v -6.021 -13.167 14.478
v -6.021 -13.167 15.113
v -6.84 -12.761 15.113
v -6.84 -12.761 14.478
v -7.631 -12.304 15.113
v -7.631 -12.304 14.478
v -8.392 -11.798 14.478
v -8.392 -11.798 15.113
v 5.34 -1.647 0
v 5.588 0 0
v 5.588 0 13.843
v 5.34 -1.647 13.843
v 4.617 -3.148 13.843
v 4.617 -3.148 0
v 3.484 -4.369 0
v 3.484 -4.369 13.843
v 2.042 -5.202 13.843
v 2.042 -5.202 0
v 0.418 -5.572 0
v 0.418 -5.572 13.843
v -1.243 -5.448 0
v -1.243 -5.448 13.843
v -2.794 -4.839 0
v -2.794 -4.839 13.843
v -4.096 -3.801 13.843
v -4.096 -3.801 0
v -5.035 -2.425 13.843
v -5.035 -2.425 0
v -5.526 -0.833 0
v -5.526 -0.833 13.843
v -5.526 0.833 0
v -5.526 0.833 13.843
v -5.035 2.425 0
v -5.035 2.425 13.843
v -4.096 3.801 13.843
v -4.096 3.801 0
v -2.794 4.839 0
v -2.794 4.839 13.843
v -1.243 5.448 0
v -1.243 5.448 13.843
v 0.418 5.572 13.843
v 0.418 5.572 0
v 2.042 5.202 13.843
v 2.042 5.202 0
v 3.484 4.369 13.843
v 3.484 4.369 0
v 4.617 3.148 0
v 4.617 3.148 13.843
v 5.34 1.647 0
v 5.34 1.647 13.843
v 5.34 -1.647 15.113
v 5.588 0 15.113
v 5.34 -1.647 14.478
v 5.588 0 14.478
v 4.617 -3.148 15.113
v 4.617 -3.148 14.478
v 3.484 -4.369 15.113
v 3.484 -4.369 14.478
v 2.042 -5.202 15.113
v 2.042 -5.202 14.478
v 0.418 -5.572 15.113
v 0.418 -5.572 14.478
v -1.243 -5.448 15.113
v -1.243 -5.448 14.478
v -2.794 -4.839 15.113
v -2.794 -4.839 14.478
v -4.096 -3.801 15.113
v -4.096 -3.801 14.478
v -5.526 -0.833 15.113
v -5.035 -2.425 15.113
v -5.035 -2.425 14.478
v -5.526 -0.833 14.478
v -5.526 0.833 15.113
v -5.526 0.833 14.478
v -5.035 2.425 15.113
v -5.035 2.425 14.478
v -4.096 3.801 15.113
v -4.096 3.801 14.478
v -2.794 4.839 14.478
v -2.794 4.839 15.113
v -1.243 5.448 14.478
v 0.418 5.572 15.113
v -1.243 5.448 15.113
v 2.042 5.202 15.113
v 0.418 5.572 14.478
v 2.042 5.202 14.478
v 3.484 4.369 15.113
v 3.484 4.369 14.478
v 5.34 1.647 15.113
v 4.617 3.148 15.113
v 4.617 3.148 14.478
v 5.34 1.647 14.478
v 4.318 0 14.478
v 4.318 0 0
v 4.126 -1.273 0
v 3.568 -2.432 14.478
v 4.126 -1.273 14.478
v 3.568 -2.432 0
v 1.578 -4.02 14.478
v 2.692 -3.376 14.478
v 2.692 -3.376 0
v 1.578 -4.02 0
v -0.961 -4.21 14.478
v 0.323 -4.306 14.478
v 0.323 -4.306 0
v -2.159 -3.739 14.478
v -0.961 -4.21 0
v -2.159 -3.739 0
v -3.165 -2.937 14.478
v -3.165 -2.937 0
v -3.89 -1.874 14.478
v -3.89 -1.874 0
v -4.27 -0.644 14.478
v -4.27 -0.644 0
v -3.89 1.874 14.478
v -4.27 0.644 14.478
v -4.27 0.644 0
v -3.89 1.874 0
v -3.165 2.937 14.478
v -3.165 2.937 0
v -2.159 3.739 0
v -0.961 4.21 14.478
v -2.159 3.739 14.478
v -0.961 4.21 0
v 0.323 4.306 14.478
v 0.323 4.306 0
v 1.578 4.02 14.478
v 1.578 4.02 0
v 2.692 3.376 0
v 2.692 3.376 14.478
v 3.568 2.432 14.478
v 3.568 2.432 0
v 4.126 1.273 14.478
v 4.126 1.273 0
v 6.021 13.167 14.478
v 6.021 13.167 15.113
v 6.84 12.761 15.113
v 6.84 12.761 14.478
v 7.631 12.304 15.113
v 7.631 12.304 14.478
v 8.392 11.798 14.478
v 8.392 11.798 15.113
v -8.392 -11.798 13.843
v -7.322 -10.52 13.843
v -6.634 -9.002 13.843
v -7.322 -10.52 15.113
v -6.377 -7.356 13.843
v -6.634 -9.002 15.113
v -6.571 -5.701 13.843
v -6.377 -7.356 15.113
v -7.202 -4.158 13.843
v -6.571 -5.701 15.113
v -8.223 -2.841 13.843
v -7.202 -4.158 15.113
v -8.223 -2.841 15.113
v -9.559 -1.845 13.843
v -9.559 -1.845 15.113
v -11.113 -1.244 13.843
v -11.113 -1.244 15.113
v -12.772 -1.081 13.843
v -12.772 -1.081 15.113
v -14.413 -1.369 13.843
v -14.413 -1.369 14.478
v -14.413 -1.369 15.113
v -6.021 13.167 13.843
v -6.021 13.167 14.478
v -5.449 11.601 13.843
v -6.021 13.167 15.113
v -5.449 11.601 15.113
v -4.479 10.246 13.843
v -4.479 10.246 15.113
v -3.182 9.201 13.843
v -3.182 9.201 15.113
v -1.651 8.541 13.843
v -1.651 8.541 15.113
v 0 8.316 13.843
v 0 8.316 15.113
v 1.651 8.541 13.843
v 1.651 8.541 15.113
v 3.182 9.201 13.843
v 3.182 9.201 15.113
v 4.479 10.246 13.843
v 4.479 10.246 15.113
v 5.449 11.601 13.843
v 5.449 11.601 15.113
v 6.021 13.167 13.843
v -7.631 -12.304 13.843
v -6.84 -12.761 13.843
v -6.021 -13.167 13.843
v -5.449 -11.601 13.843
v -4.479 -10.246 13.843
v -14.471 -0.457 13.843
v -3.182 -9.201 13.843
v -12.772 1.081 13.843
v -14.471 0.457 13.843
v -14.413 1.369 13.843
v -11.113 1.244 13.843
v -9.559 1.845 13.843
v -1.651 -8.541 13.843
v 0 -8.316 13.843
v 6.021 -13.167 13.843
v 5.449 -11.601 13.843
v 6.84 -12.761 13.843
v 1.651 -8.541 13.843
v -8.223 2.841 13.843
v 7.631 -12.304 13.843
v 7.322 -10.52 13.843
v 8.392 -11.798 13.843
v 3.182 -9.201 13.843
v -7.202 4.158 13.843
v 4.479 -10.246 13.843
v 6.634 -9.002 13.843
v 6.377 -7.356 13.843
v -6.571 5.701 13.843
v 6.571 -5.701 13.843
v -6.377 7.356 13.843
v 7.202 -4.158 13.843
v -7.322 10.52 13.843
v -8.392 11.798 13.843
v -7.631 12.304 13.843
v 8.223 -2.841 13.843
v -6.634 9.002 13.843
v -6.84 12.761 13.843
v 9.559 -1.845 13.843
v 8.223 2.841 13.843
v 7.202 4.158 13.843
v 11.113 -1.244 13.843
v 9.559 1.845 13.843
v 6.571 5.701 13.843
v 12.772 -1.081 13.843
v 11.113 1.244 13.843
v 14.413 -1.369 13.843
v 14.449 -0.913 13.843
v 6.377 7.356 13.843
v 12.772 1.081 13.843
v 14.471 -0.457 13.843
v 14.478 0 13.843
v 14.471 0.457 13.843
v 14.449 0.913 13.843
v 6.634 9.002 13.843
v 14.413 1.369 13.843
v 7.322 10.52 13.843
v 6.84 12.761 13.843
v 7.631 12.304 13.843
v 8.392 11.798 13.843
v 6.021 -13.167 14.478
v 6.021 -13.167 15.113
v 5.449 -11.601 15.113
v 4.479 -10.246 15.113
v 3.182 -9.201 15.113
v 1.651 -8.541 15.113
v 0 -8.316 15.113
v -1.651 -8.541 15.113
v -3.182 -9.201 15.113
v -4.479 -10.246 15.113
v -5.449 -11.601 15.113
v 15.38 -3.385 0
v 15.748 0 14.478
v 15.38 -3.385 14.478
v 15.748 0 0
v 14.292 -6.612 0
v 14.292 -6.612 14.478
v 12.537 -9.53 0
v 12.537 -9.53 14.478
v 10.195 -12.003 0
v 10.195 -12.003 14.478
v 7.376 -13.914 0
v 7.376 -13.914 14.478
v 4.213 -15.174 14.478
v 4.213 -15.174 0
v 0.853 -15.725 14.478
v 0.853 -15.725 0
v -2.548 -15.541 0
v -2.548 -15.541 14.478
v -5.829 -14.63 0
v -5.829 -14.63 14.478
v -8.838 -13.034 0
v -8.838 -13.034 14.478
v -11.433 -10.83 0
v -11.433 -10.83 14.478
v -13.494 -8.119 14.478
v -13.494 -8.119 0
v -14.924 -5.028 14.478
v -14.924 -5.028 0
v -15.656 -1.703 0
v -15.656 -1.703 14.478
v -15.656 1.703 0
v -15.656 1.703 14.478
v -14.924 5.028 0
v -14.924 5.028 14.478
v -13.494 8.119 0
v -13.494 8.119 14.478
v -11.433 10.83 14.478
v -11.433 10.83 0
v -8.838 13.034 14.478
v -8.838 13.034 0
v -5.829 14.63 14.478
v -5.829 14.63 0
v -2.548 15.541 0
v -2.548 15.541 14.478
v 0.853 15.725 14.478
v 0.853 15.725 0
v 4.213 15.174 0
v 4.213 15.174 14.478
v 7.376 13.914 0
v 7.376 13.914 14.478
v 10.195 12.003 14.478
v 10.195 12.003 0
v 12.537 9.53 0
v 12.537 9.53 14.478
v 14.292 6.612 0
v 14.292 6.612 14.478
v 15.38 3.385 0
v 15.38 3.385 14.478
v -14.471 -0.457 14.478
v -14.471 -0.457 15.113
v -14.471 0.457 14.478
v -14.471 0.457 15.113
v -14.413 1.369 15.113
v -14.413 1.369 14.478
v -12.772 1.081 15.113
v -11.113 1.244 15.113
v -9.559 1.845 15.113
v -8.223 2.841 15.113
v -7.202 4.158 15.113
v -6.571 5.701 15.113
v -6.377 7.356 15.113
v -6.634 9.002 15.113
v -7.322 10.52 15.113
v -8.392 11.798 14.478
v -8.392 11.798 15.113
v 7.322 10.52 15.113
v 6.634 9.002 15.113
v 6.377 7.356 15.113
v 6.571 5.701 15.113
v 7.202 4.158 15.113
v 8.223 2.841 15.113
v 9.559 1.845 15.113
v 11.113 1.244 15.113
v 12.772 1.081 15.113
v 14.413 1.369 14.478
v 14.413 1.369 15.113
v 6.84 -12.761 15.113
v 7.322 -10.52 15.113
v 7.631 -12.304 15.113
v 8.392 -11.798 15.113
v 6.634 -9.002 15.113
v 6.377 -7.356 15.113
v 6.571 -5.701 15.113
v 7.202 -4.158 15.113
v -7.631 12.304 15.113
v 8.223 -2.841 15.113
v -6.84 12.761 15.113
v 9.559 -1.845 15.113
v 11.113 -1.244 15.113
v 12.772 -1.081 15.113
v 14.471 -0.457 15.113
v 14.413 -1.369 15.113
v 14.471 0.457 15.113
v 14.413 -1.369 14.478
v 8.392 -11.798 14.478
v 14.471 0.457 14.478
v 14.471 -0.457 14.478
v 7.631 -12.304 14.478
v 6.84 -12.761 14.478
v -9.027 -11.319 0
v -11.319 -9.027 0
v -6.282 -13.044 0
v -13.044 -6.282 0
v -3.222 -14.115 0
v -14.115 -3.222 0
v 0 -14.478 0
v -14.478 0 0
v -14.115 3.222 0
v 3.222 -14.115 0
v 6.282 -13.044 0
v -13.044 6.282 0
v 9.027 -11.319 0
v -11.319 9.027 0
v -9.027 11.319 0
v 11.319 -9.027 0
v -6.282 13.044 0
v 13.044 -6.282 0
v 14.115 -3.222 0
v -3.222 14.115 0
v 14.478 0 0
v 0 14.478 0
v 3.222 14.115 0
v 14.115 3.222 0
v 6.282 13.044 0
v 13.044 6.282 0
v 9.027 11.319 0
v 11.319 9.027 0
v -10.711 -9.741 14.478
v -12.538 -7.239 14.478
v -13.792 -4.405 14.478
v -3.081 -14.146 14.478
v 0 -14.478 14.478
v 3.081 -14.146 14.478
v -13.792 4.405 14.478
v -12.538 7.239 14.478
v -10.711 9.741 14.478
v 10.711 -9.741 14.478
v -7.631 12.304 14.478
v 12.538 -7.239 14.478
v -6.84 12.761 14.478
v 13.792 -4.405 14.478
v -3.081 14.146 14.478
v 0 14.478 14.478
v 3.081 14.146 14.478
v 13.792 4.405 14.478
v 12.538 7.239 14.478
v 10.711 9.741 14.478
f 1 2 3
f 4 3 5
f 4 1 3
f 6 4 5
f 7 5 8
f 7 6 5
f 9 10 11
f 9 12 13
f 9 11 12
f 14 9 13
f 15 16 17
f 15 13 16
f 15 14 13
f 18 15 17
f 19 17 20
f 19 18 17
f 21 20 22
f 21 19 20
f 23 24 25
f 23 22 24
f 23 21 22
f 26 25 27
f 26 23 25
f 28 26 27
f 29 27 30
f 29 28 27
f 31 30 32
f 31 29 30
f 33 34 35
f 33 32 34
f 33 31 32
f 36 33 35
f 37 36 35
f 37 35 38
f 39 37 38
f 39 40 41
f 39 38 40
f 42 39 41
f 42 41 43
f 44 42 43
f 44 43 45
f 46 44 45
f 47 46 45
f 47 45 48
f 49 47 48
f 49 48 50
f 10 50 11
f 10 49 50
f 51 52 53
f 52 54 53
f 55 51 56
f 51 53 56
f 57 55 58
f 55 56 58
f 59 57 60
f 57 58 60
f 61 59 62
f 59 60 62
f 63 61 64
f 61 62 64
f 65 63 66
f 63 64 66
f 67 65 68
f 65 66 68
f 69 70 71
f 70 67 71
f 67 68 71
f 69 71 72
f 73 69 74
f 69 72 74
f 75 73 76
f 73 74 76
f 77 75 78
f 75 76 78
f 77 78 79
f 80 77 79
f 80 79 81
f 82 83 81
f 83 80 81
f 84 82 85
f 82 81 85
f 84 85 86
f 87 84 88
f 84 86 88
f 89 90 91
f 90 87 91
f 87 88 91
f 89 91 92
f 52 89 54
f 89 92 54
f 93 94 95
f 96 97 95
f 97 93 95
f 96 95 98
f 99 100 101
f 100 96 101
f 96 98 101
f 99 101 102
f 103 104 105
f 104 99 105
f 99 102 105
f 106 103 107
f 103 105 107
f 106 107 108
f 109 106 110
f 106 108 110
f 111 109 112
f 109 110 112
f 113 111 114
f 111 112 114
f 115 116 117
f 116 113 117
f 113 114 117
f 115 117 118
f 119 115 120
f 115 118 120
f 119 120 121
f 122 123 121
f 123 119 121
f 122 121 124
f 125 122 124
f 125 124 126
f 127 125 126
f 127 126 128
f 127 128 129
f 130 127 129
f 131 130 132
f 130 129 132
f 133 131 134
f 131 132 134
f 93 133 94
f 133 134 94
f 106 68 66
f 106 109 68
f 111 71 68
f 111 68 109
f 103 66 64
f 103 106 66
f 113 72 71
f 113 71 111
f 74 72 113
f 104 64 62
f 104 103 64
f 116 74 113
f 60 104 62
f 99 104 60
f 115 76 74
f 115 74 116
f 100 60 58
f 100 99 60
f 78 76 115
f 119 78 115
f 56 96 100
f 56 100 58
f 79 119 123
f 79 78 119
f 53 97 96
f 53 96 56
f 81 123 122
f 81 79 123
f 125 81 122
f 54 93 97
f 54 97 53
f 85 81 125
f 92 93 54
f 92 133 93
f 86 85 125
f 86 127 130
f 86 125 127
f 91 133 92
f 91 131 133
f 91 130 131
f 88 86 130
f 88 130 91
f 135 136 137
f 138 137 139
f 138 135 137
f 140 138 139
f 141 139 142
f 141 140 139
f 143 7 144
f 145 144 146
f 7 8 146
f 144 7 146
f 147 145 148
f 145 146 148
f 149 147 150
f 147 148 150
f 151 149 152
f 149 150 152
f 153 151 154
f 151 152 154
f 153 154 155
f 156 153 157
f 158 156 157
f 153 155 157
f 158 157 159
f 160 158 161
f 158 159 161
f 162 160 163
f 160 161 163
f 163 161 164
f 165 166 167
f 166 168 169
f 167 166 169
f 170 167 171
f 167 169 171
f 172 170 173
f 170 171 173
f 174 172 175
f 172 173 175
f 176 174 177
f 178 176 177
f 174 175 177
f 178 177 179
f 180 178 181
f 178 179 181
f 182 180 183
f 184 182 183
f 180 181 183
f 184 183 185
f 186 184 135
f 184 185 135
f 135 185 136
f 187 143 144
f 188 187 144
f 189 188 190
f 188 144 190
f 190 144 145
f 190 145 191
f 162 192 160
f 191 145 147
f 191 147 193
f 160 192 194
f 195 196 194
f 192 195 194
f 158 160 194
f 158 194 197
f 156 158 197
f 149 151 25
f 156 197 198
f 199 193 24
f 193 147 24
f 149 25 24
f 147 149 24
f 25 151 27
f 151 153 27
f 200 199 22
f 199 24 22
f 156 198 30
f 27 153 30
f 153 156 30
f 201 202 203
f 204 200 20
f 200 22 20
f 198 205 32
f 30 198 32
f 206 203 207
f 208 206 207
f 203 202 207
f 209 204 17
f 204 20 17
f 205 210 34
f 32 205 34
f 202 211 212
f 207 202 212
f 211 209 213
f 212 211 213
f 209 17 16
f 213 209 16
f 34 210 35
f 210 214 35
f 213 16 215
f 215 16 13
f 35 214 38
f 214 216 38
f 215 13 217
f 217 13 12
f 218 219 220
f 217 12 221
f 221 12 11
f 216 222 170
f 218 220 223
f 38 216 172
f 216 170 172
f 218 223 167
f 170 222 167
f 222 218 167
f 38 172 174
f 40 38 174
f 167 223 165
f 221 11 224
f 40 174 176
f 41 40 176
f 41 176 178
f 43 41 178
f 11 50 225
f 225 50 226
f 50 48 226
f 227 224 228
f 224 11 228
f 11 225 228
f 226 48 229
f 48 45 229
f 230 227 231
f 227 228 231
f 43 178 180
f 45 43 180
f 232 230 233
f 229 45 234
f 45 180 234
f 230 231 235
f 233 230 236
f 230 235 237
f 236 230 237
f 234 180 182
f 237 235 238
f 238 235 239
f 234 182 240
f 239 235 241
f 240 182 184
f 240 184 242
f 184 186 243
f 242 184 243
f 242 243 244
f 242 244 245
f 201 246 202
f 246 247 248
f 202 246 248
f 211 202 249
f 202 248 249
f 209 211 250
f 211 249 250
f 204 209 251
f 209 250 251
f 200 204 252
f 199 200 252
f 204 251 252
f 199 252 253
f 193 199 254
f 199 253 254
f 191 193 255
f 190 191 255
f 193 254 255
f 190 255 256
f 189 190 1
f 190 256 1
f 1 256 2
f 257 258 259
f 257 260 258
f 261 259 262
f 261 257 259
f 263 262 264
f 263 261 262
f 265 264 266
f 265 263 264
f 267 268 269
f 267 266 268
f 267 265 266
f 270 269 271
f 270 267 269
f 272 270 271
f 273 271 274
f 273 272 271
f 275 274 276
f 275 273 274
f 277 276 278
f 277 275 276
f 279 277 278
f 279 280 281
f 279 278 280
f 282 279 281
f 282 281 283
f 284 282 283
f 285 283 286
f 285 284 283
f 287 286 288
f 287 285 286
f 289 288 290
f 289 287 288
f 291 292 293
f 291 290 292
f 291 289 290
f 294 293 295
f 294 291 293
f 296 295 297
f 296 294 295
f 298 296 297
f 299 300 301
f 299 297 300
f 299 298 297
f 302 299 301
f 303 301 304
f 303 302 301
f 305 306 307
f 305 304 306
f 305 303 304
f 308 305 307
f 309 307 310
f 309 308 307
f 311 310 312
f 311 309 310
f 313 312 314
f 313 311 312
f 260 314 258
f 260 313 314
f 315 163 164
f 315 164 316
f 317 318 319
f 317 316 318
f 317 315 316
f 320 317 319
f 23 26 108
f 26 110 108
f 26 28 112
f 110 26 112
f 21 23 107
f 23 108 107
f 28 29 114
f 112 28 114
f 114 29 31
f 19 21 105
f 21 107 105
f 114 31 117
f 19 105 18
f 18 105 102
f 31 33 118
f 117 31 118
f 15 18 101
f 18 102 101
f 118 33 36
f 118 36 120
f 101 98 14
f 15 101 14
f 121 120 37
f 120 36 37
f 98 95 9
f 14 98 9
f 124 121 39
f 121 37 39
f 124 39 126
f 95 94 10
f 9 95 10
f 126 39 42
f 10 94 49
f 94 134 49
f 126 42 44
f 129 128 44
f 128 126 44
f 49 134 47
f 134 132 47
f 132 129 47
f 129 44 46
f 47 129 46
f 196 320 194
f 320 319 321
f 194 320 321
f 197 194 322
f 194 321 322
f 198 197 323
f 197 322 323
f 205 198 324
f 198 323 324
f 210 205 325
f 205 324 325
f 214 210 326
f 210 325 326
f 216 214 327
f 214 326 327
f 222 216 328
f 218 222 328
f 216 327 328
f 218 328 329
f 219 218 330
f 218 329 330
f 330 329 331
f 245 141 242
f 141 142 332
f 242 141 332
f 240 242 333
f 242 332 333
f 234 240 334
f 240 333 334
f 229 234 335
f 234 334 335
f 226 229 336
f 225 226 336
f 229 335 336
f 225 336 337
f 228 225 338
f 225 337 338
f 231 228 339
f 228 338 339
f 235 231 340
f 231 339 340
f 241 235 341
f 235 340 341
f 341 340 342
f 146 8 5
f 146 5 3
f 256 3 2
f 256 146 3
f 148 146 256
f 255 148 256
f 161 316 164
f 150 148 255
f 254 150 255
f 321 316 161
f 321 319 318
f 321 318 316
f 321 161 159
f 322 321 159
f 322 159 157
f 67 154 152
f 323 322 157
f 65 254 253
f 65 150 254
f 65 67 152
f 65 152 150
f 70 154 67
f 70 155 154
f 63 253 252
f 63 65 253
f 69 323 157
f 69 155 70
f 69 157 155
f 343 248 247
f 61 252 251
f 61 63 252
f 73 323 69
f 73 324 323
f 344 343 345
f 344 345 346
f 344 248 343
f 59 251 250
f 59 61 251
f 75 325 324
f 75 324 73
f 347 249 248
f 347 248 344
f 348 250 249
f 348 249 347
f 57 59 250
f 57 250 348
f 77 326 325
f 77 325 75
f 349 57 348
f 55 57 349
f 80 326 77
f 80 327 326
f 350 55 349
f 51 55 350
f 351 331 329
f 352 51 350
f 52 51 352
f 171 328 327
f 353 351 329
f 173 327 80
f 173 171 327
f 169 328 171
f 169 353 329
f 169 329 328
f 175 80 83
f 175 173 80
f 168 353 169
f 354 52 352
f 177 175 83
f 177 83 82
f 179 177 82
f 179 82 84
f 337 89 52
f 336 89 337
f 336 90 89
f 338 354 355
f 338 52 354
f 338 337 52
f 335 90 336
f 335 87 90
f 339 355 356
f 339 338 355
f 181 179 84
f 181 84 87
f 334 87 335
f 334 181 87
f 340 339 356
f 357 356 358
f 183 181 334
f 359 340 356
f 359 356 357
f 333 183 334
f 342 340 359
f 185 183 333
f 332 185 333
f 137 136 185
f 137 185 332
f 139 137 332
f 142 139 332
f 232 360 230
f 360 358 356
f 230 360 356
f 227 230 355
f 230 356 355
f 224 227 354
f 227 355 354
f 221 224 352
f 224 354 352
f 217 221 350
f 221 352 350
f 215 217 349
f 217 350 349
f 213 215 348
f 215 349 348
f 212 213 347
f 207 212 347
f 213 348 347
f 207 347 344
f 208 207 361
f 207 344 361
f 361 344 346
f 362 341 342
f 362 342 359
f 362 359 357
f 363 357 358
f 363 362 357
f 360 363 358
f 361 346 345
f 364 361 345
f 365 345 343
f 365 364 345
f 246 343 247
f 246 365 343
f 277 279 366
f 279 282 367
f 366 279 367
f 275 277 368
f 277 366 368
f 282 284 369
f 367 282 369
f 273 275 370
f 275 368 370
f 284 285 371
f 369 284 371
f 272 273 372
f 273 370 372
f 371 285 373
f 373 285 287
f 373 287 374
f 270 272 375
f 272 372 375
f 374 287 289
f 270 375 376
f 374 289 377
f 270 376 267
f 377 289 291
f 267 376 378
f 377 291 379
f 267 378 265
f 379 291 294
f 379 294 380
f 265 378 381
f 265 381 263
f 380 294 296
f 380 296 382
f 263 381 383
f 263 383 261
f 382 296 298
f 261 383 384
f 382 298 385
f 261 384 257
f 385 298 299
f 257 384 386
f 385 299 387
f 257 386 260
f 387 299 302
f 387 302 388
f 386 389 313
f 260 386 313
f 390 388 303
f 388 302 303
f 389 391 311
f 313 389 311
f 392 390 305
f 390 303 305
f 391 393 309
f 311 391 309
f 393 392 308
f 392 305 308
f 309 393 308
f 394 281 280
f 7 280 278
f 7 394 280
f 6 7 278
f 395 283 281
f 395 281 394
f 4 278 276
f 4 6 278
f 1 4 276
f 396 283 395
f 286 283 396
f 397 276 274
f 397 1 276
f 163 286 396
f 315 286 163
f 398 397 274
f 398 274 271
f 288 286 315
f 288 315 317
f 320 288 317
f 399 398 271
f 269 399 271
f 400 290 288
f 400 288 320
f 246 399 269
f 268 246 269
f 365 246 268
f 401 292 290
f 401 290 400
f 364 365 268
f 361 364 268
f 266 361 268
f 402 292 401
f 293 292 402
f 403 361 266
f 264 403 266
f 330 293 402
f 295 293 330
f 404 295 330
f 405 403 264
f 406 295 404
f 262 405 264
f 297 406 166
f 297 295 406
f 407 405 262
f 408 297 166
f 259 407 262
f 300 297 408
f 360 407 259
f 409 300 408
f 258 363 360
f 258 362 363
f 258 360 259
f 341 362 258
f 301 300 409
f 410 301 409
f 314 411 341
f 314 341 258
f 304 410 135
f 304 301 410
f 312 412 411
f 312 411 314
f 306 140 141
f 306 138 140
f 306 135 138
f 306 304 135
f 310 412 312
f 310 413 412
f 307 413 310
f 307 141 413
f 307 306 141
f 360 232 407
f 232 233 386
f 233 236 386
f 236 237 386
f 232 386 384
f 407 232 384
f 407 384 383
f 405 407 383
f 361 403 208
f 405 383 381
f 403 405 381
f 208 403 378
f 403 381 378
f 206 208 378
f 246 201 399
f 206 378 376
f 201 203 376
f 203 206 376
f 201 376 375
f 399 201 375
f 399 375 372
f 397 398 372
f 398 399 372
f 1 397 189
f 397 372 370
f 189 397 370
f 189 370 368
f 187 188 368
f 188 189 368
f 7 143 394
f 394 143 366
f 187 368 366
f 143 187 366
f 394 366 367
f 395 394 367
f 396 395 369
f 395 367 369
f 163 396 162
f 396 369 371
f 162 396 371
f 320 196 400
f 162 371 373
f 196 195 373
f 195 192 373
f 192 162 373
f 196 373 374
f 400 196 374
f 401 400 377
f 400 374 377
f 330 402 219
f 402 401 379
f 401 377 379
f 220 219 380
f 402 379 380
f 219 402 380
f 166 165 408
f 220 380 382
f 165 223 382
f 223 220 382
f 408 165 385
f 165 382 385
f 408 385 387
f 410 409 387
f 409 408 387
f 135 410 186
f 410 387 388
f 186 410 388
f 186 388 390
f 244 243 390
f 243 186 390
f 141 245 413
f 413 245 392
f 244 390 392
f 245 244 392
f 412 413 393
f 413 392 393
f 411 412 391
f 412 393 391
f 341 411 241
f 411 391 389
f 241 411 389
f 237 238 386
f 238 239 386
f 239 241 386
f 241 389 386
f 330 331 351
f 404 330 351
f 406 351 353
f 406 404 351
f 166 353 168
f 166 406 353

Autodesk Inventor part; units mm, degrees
ref_plane "YZ Plane" through (0, 0, 0) normal (1, 0, 0) x (0, 1, 0)
ref_plane "XZ Plane" through (0, 0, 0) normal (0, 1, 0) x (-1, 0, 0)
ref_plane "XY Plane" through (0, 0, 0) normal (0, 0, 1) x (1, 0, 0)
sketch "Sketch1" plane through (0, 0, 0) normal (0, 0, 1) x (1, 0, 0)
  circle A0 centre (0, 0) radius 5.588
  circle A1 centre (0, 0) radius 4.318
  circle A2 centre (0, 0) radius 14.478
  circle A3 centre (0, 0) radius 15.748
  dimension "d0" = 11.176
  dimension "d1" = 1.27
  dimension "d2" = 8.89
  dimension "d3" = 1.27
extrude "Extrusion1" add sketch "Sketch1" along normal blind 14.478
ref_plane "Work Plane1" through (0, 0, 0) normal (0, 0, -1) x (-1, 0, 0)
sketch "Sketch2" plane through (0, 0, 14.478) normal (0, 0, 1) x (1, 0, 0)
  circle A0 centre (0, 0) radius 15.748 projected
  circle A1 centre (0, 0) radius 14.478 projected
  circle A2 centre (0, 0) radius 5.588 projected
  circle A3 centre (0, 0) radius 4.318 projected
extrude "Extrusion2" add sketch "Sketch2" along normal mid plane 1.27 contours A1
sketch "Sketch3" plane through (0, 0, 15.113) normal (0, 0, 1) x (1, 0, 0)
  circle A0 centre (0, 0) radius 14.478 projected
  arc A1 (-6.0209, 13.1667) -> (6.0209, 13.1667) centre (0, 14.478) ccw
  arc A2 (-14.4131, 1.3691) -> (-8.3923, 11.7976) centre (-12.5383, 7.239) ccw
  arc A3 (-8.3923, -11.7976) -> (-14.4131, -1.3691) centre (-12.5383, -7.239) ccw
  arc A4 (6.0209, -13.1667) -> (-6.0209, -13.1667) centre (0, -14.478) ccw
  arc A5 (14.4131, -1.3691) -> (8.3923, -11.7976) centre (12.5383, -7.239) ccw
  arc A6 (8.3923, 11.7976) -> (14.4131, 1.3691) centre (12.5383, 7.239) ccw
  point P0 (14.4131, 1.3691)
  point P1 (-8.3923, 11.7976)
  point P2 (-14.4131, 1.3691)
  point P3 (-14.4131, -1.3691)
  point P4 (-8.3923, -11.7976)
  point P5 (6.0209, -13.1667)
  point P6 (14.4131, -1.3691)
  dimension "d11" = 360
extrude "Extrusion4" cut sketch "Sketch3" against normal blind 1.27 contours A6 A0 | A0 A5 | A1 A0 | A0 A4 | A2 A0 | A0 A3
properties part number "wheel" material "Iron, Cast"
